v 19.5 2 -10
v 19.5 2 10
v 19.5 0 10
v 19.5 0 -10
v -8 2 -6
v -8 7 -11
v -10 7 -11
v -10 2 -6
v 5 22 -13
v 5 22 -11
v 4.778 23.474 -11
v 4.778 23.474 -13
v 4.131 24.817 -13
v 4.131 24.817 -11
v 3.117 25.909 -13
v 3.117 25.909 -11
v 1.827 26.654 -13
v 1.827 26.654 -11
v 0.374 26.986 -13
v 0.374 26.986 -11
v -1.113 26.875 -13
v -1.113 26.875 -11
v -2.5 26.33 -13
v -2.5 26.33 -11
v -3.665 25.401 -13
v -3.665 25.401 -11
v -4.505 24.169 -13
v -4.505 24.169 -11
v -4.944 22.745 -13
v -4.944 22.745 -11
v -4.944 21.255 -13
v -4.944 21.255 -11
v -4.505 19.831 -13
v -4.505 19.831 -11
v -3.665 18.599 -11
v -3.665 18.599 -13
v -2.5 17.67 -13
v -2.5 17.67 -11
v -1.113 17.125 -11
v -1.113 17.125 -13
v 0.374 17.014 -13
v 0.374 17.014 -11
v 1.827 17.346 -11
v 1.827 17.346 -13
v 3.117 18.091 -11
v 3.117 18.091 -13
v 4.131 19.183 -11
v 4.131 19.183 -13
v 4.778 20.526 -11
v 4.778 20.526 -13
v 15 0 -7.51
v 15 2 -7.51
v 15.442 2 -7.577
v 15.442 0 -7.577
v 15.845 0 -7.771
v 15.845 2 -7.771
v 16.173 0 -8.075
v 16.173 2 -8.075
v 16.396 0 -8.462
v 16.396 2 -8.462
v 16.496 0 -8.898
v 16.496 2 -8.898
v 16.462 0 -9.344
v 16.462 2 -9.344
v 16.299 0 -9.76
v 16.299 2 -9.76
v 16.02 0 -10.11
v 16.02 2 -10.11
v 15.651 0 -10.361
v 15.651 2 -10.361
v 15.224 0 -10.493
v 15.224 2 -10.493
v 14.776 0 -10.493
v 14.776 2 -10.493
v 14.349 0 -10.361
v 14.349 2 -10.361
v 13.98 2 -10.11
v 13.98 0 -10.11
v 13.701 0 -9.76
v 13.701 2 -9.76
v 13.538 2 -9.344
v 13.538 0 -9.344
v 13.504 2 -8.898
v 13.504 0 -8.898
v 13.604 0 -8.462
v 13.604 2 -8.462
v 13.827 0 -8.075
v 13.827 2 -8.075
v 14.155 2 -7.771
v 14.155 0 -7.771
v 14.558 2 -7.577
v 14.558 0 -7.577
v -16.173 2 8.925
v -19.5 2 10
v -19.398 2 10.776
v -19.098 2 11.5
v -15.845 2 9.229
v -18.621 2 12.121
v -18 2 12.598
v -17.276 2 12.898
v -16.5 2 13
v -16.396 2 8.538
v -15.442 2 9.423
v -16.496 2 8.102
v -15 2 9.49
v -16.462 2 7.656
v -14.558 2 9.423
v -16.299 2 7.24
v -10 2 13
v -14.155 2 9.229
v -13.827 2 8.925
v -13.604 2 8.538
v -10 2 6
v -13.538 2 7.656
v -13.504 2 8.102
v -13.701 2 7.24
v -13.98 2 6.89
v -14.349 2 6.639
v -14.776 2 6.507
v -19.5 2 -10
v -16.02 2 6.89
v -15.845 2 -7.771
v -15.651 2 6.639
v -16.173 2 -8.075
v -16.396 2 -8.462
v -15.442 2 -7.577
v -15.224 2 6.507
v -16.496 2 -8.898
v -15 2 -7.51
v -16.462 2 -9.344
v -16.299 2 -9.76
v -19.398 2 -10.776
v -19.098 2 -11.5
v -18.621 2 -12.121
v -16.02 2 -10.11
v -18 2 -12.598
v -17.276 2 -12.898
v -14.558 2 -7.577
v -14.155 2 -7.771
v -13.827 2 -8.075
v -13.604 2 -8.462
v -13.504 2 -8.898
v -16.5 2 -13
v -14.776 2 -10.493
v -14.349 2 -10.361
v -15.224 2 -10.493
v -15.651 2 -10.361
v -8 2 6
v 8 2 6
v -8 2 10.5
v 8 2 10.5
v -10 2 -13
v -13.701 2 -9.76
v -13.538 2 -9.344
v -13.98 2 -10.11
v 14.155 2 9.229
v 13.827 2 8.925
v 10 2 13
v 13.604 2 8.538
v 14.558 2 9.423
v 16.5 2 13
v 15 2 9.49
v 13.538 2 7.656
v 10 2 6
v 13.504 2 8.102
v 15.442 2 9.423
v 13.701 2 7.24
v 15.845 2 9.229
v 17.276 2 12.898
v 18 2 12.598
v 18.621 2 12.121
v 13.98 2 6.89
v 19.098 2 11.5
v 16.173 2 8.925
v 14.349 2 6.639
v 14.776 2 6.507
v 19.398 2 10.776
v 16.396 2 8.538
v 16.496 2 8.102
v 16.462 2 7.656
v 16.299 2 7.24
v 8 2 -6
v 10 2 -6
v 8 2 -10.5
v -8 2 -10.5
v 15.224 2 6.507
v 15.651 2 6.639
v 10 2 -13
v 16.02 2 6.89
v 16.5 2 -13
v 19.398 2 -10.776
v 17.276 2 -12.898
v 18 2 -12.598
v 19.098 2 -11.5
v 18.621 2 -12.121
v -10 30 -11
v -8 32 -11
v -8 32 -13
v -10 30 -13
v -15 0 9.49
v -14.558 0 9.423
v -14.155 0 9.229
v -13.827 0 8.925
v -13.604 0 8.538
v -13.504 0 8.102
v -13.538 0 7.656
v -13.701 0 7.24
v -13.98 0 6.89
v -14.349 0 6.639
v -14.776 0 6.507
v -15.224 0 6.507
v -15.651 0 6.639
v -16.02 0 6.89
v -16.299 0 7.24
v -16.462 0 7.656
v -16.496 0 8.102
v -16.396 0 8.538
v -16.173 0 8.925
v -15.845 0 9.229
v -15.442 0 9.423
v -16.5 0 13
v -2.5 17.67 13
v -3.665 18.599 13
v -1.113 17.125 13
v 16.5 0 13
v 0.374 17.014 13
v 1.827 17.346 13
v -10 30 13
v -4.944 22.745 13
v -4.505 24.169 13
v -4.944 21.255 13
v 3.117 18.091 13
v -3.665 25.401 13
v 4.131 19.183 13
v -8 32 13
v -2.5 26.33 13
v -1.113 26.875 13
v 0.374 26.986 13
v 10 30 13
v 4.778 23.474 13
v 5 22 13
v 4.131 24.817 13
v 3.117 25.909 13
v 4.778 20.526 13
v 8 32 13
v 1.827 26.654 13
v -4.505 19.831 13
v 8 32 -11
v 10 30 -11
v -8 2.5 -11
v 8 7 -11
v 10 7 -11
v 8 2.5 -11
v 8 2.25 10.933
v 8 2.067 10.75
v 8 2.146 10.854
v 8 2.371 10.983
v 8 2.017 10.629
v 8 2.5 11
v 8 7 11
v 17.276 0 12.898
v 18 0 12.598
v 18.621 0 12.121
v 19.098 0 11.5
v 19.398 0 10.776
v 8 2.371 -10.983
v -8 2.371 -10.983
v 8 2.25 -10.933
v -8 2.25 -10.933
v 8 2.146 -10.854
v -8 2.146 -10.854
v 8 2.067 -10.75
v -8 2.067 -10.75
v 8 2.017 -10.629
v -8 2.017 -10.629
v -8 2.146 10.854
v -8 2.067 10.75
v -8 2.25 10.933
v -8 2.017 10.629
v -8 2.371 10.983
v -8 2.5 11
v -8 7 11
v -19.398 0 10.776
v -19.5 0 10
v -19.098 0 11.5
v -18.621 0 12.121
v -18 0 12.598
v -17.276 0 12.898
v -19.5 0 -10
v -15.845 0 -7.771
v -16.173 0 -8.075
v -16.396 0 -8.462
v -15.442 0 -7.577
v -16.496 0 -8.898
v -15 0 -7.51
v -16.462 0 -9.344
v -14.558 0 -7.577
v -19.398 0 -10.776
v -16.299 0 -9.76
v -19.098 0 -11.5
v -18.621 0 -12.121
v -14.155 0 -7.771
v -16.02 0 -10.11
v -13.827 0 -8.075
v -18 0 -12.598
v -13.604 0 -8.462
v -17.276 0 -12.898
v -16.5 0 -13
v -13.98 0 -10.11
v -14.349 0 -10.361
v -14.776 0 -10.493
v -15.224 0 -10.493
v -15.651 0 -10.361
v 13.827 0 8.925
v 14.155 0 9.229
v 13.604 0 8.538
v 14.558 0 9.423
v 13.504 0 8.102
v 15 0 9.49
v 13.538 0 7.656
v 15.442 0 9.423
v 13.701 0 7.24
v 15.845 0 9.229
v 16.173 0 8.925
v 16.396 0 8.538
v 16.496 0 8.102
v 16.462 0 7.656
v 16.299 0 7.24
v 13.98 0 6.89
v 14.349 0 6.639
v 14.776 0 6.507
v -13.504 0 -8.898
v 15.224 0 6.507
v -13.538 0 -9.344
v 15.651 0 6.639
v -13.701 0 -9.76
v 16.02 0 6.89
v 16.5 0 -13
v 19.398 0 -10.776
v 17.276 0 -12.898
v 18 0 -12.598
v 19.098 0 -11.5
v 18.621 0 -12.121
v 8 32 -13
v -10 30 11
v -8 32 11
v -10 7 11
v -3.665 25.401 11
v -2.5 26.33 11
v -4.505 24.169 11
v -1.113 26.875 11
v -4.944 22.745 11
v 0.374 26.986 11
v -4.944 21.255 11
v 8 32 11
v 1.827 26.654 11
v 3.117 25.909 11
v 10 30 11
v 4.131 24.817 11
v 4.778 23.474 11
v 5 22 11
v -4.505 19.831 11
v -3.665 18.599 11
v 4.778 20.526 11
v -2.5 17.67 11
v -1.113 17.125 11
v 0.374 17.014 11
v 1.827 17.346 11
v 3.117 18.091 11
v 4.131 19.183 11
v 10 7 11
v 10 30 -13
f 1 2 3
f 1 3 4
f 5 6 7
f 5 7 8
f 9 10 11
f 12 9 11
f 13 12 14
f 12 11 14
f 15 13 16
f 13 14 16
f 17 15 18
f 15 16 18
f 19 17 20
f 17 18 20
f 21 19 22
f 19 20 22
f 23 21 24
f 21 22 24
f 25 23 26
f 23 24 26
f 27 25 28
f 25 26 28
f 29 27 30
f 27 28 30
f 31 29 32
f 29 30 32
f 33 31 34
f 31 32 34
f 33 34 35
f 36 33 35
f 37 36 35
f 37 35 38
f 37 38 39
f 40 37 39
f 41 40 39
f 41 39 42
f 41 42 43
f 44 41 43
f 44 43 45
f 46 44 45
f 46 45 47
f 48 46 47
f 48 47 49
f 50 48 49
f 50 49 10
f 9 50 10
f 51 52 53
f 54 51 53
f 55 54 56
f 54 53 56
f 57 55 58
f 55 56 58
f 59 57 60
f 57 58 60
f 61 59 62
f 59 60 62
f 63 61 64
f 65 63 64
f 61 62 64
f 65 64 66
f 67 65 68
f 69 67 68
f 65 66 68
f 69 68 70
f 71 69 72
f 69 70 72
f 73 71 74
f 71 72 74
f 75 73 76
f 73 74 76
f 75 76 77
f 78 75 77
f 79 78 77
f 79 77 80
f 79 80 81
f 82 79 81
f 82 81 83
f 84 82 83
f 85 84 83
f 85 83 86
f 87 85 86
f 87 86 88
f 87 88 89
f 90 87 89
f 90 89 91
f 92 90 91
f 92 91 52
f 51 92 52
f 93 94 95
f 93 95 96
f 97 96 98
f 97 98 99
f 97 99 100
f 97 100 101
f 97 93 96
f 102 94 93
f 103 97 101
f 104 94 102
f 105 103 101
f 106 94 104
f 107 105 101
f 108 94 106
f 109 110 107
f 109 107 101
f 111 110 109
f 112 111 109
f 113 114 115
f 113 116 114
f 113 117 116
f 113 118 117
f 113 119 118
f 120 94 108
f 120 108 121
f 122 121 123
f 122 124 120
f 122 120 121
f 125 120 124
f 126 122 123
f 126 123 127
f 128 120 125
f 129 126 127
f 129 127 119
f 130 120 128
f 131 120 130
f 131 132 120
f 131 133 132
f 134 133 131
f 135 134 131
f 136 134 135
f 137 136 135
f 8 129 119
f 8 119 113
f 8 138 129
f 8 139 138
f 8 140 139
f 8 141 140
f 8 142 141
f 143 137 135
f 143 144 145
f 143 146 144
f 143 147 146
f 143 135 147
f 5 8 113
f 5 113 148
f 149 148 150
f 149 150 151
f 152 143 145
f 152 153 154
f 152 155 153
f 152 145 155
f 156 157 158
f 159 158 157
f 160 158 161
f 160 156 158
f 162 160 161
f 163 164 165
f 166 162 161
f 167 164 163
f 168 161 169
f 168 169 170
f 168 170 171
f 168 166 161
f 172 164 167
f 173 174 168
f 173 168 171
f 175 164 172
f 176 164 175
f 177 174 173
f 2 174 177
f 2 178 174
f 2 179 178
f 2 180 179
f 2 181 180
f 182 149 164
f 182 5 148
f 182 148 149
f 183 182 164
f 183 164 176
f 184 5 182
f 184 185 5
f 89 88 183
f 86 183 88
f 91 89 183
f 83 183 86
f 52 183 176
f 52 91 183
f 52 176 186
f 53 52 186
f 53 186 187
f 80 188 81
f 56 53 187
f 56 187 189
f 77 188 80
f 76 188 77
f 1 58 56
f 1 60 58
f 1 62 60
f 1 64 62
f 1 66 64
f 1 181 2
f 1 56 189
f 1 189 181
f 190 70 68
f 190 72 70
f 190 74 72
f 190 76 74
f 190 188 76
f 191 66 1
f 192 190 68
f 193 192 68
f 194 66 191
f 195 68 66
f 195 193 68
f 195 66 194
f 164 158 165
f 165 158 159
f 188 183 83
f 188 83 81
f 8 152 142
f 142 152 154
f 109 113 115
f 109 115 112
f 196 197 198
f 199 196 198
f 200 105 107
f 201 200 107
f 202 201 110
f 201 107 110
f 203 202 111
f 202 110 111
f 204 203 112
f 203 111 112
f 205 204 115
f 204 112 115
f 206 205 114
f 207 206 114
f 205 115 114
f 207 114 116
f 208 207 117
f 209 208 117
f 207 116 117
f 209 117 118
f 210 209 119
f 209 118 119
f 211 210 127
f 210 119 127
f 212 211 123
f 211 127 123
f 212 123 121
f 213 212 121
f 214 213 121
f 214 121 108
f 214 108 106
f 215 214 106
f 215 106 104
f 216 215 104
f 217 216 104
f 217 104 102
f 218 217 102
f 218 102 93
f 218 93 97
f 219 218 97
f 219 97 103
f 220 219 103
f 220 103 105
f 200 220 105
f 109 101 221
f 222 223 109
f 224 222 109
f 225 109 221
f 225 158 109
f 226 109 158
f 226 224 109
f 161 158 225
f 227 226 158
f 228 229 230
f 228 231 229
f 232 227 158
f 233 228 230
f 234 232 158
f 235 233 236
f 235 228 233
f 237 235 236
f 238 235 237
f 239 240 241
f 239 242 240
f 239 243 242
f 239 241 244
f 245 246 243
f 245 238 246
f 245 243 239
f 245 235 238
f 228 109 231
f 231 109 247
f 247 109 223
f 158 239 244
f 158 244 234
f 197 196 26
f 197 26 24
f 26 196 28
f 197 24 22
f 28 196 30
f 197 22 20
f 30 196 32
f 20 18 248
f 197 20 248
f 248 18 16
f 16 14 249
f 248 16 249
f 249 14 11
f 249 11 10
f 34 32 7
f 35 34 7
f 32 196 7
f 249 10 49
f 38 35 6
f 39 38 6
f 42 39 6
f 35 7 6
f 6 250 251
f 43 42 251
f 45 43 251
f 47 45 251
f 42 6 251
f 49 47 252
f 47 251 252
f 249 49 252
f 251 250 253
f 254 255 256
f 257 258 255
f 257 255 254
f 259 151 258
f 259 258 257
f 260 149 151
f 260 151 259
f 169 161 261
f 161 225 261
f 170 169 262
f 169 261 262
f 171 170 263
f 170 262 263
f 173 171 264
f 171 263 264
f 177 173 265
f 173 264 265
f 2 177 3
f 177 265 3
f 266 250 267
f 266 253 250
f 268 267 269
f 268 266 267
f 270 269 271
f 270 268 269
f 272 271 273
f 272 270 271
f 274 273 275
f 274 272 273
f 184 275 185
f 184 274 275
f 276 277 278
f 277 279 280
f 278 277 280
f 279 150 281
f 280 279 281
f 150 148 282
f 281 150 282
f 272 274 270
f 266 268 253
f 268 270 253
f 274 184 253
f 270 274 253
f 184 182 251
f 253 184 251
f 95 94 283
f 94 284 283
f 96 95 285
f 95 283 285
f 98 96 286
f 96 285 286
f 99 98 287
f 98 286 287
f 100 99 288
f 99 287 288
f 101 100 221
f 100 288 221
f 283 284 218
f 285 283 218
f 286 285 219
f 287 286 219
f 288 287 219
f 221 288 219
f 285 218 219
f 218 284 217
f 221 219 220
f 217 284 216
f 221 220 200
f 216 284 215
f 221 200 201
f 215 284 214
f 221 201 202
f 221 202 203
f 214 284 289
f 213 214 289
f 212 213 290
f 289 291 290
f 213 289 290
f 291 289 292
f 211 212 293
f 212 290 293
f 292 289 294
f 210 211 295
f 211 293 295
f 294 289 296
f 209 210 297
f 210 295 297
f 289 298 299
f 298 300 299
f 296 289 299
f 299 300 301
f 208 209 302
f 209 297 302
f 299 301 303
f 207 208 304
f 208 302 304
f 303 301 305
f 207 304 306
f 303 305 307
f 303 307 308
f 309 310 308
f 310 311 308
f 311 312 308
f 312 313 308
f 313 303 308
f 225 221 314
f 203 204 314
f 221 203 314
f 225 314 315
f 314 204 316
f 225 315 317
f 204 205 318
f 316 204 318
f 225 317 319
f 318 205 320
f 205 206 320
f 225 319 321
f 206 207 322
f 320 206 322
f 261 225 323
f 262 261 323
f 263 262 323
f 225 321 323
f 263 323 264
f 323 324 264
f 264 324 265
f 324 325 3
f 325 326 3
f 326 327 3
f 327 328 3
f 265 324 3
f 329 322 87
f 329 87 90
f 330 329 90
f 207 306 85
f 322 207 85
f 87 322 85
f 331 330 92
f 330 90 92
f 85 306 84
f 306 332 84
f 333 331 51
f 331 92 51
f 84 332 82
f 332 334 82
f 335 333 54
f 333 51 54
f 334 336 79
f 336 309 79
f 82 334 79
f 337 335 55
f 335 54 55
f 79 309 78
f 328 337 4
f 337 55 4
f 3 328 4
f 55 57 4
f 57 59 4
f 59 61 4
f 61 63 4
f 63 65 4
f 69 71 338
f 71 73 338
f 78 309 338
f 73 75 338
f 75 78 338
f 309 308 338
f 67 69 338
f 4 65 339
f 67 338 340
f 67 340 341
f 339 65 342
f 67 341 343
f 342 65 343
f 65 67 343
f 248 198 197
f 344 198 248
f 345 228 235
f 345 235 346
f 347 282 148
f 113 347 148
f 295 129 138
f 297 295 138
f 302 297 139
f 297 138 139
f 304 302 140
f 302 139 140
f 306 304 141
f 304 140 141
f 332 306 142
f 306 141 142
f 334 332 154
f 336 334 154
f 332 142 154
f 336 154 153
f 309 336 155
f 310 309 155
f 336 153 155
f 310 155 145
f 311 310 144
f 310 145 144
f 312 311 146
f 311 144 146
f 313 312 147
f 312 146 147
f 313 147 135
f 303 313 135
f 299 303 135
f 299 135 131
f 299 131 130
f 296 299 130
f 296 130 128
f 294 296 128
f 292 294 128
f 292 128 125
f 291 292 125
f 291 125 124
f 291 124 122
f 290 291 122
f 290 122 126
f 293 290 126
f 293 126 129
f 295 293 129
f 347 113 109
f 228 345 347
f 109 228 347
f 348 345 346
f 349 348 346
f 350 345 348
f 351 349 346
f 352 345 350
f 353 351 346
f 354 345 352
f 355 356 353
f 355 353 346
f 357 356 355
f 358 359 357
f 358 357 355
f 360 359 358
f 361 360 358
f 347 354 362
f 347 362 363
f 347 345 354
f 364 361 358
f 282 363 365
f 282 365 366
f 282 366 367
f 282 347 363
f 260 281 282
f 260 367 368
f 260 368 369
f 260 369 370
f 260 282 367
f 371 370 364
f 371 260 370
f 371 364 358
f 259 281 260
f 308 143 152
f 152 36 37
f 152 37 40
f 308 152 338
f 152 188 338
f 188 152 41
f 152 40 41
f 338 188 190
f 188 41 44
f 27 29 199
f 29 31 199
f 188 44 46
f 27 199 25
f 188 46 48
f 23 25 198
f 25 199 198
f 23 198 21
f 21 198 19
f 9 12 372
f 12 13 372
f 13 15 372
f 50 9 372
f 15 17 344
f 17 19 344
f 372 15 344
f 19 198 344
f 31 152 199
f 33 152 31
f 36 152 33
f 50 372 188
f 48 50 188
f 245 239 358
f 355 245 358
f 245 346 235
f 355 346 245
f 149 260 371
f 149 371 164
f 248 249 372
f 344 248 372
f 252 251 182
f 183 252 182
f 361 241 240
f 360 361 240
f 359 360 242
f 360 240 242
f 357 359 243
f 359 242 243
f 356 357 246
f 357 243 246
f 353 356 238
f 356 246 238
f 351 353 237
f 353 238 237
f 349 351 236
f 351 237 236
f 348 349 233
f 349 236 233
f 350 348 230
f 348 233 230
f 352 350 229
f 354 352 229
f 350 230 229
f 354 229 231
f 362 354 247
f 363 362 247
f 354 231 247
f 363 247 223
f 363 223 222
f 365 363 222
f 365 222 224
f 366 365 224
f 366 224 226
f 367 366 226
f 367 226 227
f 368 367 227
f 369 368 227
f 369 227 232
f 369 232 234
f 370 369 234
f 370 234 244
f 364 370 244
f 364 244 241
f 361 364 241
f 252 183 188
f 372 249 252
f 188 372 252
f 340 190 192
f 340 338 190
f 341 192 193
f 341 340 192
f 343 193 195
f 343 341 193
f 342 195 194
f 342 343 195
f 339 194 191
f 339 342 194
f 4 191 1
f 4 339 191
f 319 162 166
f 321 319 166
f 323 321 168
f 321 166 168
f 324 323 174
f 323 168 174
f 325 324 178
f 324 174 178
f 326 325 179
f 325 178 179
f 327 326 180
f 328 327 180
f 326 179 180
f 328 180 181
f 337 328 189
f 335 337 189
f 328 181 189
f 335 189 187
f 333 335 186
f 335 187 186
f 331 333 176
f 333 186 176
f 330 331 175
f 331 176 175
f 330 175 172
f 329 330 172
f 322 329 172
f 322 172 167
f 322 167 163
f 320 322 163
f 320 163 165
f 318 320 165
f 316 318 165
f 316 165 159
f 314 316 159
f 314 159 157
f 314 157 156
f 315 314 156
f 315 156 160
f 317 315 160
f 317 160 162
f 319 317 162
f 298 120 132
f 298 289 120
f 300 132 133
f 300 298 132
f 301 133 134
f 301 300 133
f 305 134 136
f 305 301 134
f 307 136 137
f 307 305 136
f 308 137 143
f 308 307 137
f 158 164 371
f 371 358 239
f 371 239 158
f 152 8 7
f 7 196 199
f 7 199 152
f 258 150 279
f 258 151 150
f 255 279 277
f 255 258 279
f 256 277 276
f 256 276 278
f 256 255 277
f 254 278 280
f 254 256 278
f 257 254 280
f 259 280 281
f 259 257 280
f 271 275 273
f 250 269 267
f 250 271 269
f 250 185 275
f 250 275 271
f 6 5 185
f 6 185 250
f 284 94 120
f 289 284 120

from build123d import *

# Parameters (mm, degrees)
SKETCH1_W            = 20
SKETCH1_H            = 26
BOSS_EXTRUDE1_DEPTH  = 2
SKETCH2_W            = 20
SKETCH2_H            = 2
BOSS_EXTRUDE2_DEPTH  = 30
SKETCH3_R            = 5
CUT_EXTRUDE1_DEPTH   = 43.426406871
SKETCH4_W            = 39
SKETCH4_H            = 26
BOSS_EXTRUDE3_DEPTH  = 2
SKETCH5_R            = 1.5
CUT_EXTRUDE2_DEPTH   = 39.069016273
FILLET1_R            = 3
CHAMFER1_SIZE        = 2
RIB3_START           = -2
RIB3_DEPTH           = 2
MIRROR2_START        = -2
MIRROR2_COPY_1_DEPTH = 2
FILLET2_R            = 0.5


# Read off the part's stored shape, not the designer's step: Rib3
with BuildPart() as part:
    # Sketch1 → Boss-Extrude1 (new body)
    with BuildSketch(Plane(origin=(0, 0, 0), x_dir=(1, 0, 0), z_dir=(0, 1, 0))):
        Rectangle(SKETCH1_W, SKETCH1_H)
    extrude(amount=BOSS_EXTRUDE1_DEPTH)

    # Sketch2 → Boss-Extrude2 (add)
    with BuildSketch(Plane(origin=(0, 2, 0), x_dir=(1, 0, 0), z_dir=(0, 1, 0))):
        with Locations((0, -12)):
            Rectangle(SKETCH2_W, SKETCH2_H)
        with Locations((0, 12)):
            Rectangle(SKETCH2_W, SKETCH2_H)
    extrude(amount=BOSS_EXTRUDE2_DEPTH)

    # Sketch3 → Cut-Extrude1 (cut, through all)
    with BuildSketch(Plane.XY.offset(13)):
        with Locations((0, 22)):
            Circle(SKETCH3_R)
    extrude(amount=-CUT_EXTRUDE1_DEPTH, mode=Mode.SUBTRACT)

    # Sketch4 → Boss-Extrude3 (add)
    with BuildSketch(Plane(origin=(0, 2, 0), x_dir=(1, 0, 0), z_dir=(0, 1, 0))):
        Rectangle(SKETCH4_W, SKETCH4_H)
    extrude(amount=-BOSS_EXTRUDE3_DEPTH)

    # Sketch5 → Cut-Extrude2 (cut, through all)
    with BuildSketch(Plane(origin=(0, 2, 0), x_dir=(1, 0, 0), z_dir=(0, 1, 0))):
        with Locations(Location((-15, 9.01, 0), (0, 0, 270))):
            Circle(SKETCH5_R)
        with Locations(Location((-15, -7.99, 0), (0, 0, 270))):
            Circle(SKETCH5_R)
        with Locations(Location((15, -7.99, 0), (0, 0, 270))):
            Circle(SKETCH5_R)
        with Locations(Location((15, 9.01, 0), (0, 0, 270))):
            Circle(SKETCH5_R)
    extrude(amount=-CUT_EXTRUDE2_DEPTH, mode=Mode.SUBTRACT)

    # Fillet1
    fillet1_edges = [part.edges().sort_by_distance(p)[0] for p in [
        (-19.5, 1, -13),
        (19.5, 1, 13),
        (-19.5, 1, 13),
        (19.5, 1, -13),
    ]]
    fillet(fillet1_edges, radius=FILLET1_R)

    # Chamfer1
    chamfer1_edges = [part.edges().sort_by_distance(p)[0] for p in [
        (10, 32, 12),
        (-10, 32, 12),
        (-10, 32, -12),
        (10, 32, -12),
    ]]
    chamfer(chamfer1_edges, length=CHAMFER1_SIZE)

    # Rib3 outline → Rib3 (add)
    with BuildSketch(Plane(origin=(10, 0, 0), x_dir=(0, 0, -1), z_dir=(1, 0, 0)).offset(RIB3_START)):
        Polygon((11, 2), (11, 7), (6, 2), align=None)
    rib3 = extrude(amount=RIB3_DEPTH)

    # Mirror1: Rib3 across plane
    add(rib3.mirror(Plane.XY))

    # Mirror2: Rib3 across plane
    add(rib3.mirror(Plane(origin=(0, 0, 0), x_dir=(0, 0, 1), z_dir=(1, 0, 0))))

    # Mirror2 copy 1 sketch → Mirror2 copy 1 (add)
    with BuildSketch(Plane.ZY.offset(10).offset(MIRROR2_START)):
        Polygon((11, 2), (11, 7), (6, 2), align=None)
    extrude(amount=MIRROR2_COPY_1_DEPTH)

    # Fillet2
    fillet2_edges = [part.edges().sort_by_distance(p)[0] for p in [
        (0, 2, 11),
        (0, 2, -11),
    ]]
    fillet(fillet2_edges, radius=FILLET2_R)


solid = part.part
